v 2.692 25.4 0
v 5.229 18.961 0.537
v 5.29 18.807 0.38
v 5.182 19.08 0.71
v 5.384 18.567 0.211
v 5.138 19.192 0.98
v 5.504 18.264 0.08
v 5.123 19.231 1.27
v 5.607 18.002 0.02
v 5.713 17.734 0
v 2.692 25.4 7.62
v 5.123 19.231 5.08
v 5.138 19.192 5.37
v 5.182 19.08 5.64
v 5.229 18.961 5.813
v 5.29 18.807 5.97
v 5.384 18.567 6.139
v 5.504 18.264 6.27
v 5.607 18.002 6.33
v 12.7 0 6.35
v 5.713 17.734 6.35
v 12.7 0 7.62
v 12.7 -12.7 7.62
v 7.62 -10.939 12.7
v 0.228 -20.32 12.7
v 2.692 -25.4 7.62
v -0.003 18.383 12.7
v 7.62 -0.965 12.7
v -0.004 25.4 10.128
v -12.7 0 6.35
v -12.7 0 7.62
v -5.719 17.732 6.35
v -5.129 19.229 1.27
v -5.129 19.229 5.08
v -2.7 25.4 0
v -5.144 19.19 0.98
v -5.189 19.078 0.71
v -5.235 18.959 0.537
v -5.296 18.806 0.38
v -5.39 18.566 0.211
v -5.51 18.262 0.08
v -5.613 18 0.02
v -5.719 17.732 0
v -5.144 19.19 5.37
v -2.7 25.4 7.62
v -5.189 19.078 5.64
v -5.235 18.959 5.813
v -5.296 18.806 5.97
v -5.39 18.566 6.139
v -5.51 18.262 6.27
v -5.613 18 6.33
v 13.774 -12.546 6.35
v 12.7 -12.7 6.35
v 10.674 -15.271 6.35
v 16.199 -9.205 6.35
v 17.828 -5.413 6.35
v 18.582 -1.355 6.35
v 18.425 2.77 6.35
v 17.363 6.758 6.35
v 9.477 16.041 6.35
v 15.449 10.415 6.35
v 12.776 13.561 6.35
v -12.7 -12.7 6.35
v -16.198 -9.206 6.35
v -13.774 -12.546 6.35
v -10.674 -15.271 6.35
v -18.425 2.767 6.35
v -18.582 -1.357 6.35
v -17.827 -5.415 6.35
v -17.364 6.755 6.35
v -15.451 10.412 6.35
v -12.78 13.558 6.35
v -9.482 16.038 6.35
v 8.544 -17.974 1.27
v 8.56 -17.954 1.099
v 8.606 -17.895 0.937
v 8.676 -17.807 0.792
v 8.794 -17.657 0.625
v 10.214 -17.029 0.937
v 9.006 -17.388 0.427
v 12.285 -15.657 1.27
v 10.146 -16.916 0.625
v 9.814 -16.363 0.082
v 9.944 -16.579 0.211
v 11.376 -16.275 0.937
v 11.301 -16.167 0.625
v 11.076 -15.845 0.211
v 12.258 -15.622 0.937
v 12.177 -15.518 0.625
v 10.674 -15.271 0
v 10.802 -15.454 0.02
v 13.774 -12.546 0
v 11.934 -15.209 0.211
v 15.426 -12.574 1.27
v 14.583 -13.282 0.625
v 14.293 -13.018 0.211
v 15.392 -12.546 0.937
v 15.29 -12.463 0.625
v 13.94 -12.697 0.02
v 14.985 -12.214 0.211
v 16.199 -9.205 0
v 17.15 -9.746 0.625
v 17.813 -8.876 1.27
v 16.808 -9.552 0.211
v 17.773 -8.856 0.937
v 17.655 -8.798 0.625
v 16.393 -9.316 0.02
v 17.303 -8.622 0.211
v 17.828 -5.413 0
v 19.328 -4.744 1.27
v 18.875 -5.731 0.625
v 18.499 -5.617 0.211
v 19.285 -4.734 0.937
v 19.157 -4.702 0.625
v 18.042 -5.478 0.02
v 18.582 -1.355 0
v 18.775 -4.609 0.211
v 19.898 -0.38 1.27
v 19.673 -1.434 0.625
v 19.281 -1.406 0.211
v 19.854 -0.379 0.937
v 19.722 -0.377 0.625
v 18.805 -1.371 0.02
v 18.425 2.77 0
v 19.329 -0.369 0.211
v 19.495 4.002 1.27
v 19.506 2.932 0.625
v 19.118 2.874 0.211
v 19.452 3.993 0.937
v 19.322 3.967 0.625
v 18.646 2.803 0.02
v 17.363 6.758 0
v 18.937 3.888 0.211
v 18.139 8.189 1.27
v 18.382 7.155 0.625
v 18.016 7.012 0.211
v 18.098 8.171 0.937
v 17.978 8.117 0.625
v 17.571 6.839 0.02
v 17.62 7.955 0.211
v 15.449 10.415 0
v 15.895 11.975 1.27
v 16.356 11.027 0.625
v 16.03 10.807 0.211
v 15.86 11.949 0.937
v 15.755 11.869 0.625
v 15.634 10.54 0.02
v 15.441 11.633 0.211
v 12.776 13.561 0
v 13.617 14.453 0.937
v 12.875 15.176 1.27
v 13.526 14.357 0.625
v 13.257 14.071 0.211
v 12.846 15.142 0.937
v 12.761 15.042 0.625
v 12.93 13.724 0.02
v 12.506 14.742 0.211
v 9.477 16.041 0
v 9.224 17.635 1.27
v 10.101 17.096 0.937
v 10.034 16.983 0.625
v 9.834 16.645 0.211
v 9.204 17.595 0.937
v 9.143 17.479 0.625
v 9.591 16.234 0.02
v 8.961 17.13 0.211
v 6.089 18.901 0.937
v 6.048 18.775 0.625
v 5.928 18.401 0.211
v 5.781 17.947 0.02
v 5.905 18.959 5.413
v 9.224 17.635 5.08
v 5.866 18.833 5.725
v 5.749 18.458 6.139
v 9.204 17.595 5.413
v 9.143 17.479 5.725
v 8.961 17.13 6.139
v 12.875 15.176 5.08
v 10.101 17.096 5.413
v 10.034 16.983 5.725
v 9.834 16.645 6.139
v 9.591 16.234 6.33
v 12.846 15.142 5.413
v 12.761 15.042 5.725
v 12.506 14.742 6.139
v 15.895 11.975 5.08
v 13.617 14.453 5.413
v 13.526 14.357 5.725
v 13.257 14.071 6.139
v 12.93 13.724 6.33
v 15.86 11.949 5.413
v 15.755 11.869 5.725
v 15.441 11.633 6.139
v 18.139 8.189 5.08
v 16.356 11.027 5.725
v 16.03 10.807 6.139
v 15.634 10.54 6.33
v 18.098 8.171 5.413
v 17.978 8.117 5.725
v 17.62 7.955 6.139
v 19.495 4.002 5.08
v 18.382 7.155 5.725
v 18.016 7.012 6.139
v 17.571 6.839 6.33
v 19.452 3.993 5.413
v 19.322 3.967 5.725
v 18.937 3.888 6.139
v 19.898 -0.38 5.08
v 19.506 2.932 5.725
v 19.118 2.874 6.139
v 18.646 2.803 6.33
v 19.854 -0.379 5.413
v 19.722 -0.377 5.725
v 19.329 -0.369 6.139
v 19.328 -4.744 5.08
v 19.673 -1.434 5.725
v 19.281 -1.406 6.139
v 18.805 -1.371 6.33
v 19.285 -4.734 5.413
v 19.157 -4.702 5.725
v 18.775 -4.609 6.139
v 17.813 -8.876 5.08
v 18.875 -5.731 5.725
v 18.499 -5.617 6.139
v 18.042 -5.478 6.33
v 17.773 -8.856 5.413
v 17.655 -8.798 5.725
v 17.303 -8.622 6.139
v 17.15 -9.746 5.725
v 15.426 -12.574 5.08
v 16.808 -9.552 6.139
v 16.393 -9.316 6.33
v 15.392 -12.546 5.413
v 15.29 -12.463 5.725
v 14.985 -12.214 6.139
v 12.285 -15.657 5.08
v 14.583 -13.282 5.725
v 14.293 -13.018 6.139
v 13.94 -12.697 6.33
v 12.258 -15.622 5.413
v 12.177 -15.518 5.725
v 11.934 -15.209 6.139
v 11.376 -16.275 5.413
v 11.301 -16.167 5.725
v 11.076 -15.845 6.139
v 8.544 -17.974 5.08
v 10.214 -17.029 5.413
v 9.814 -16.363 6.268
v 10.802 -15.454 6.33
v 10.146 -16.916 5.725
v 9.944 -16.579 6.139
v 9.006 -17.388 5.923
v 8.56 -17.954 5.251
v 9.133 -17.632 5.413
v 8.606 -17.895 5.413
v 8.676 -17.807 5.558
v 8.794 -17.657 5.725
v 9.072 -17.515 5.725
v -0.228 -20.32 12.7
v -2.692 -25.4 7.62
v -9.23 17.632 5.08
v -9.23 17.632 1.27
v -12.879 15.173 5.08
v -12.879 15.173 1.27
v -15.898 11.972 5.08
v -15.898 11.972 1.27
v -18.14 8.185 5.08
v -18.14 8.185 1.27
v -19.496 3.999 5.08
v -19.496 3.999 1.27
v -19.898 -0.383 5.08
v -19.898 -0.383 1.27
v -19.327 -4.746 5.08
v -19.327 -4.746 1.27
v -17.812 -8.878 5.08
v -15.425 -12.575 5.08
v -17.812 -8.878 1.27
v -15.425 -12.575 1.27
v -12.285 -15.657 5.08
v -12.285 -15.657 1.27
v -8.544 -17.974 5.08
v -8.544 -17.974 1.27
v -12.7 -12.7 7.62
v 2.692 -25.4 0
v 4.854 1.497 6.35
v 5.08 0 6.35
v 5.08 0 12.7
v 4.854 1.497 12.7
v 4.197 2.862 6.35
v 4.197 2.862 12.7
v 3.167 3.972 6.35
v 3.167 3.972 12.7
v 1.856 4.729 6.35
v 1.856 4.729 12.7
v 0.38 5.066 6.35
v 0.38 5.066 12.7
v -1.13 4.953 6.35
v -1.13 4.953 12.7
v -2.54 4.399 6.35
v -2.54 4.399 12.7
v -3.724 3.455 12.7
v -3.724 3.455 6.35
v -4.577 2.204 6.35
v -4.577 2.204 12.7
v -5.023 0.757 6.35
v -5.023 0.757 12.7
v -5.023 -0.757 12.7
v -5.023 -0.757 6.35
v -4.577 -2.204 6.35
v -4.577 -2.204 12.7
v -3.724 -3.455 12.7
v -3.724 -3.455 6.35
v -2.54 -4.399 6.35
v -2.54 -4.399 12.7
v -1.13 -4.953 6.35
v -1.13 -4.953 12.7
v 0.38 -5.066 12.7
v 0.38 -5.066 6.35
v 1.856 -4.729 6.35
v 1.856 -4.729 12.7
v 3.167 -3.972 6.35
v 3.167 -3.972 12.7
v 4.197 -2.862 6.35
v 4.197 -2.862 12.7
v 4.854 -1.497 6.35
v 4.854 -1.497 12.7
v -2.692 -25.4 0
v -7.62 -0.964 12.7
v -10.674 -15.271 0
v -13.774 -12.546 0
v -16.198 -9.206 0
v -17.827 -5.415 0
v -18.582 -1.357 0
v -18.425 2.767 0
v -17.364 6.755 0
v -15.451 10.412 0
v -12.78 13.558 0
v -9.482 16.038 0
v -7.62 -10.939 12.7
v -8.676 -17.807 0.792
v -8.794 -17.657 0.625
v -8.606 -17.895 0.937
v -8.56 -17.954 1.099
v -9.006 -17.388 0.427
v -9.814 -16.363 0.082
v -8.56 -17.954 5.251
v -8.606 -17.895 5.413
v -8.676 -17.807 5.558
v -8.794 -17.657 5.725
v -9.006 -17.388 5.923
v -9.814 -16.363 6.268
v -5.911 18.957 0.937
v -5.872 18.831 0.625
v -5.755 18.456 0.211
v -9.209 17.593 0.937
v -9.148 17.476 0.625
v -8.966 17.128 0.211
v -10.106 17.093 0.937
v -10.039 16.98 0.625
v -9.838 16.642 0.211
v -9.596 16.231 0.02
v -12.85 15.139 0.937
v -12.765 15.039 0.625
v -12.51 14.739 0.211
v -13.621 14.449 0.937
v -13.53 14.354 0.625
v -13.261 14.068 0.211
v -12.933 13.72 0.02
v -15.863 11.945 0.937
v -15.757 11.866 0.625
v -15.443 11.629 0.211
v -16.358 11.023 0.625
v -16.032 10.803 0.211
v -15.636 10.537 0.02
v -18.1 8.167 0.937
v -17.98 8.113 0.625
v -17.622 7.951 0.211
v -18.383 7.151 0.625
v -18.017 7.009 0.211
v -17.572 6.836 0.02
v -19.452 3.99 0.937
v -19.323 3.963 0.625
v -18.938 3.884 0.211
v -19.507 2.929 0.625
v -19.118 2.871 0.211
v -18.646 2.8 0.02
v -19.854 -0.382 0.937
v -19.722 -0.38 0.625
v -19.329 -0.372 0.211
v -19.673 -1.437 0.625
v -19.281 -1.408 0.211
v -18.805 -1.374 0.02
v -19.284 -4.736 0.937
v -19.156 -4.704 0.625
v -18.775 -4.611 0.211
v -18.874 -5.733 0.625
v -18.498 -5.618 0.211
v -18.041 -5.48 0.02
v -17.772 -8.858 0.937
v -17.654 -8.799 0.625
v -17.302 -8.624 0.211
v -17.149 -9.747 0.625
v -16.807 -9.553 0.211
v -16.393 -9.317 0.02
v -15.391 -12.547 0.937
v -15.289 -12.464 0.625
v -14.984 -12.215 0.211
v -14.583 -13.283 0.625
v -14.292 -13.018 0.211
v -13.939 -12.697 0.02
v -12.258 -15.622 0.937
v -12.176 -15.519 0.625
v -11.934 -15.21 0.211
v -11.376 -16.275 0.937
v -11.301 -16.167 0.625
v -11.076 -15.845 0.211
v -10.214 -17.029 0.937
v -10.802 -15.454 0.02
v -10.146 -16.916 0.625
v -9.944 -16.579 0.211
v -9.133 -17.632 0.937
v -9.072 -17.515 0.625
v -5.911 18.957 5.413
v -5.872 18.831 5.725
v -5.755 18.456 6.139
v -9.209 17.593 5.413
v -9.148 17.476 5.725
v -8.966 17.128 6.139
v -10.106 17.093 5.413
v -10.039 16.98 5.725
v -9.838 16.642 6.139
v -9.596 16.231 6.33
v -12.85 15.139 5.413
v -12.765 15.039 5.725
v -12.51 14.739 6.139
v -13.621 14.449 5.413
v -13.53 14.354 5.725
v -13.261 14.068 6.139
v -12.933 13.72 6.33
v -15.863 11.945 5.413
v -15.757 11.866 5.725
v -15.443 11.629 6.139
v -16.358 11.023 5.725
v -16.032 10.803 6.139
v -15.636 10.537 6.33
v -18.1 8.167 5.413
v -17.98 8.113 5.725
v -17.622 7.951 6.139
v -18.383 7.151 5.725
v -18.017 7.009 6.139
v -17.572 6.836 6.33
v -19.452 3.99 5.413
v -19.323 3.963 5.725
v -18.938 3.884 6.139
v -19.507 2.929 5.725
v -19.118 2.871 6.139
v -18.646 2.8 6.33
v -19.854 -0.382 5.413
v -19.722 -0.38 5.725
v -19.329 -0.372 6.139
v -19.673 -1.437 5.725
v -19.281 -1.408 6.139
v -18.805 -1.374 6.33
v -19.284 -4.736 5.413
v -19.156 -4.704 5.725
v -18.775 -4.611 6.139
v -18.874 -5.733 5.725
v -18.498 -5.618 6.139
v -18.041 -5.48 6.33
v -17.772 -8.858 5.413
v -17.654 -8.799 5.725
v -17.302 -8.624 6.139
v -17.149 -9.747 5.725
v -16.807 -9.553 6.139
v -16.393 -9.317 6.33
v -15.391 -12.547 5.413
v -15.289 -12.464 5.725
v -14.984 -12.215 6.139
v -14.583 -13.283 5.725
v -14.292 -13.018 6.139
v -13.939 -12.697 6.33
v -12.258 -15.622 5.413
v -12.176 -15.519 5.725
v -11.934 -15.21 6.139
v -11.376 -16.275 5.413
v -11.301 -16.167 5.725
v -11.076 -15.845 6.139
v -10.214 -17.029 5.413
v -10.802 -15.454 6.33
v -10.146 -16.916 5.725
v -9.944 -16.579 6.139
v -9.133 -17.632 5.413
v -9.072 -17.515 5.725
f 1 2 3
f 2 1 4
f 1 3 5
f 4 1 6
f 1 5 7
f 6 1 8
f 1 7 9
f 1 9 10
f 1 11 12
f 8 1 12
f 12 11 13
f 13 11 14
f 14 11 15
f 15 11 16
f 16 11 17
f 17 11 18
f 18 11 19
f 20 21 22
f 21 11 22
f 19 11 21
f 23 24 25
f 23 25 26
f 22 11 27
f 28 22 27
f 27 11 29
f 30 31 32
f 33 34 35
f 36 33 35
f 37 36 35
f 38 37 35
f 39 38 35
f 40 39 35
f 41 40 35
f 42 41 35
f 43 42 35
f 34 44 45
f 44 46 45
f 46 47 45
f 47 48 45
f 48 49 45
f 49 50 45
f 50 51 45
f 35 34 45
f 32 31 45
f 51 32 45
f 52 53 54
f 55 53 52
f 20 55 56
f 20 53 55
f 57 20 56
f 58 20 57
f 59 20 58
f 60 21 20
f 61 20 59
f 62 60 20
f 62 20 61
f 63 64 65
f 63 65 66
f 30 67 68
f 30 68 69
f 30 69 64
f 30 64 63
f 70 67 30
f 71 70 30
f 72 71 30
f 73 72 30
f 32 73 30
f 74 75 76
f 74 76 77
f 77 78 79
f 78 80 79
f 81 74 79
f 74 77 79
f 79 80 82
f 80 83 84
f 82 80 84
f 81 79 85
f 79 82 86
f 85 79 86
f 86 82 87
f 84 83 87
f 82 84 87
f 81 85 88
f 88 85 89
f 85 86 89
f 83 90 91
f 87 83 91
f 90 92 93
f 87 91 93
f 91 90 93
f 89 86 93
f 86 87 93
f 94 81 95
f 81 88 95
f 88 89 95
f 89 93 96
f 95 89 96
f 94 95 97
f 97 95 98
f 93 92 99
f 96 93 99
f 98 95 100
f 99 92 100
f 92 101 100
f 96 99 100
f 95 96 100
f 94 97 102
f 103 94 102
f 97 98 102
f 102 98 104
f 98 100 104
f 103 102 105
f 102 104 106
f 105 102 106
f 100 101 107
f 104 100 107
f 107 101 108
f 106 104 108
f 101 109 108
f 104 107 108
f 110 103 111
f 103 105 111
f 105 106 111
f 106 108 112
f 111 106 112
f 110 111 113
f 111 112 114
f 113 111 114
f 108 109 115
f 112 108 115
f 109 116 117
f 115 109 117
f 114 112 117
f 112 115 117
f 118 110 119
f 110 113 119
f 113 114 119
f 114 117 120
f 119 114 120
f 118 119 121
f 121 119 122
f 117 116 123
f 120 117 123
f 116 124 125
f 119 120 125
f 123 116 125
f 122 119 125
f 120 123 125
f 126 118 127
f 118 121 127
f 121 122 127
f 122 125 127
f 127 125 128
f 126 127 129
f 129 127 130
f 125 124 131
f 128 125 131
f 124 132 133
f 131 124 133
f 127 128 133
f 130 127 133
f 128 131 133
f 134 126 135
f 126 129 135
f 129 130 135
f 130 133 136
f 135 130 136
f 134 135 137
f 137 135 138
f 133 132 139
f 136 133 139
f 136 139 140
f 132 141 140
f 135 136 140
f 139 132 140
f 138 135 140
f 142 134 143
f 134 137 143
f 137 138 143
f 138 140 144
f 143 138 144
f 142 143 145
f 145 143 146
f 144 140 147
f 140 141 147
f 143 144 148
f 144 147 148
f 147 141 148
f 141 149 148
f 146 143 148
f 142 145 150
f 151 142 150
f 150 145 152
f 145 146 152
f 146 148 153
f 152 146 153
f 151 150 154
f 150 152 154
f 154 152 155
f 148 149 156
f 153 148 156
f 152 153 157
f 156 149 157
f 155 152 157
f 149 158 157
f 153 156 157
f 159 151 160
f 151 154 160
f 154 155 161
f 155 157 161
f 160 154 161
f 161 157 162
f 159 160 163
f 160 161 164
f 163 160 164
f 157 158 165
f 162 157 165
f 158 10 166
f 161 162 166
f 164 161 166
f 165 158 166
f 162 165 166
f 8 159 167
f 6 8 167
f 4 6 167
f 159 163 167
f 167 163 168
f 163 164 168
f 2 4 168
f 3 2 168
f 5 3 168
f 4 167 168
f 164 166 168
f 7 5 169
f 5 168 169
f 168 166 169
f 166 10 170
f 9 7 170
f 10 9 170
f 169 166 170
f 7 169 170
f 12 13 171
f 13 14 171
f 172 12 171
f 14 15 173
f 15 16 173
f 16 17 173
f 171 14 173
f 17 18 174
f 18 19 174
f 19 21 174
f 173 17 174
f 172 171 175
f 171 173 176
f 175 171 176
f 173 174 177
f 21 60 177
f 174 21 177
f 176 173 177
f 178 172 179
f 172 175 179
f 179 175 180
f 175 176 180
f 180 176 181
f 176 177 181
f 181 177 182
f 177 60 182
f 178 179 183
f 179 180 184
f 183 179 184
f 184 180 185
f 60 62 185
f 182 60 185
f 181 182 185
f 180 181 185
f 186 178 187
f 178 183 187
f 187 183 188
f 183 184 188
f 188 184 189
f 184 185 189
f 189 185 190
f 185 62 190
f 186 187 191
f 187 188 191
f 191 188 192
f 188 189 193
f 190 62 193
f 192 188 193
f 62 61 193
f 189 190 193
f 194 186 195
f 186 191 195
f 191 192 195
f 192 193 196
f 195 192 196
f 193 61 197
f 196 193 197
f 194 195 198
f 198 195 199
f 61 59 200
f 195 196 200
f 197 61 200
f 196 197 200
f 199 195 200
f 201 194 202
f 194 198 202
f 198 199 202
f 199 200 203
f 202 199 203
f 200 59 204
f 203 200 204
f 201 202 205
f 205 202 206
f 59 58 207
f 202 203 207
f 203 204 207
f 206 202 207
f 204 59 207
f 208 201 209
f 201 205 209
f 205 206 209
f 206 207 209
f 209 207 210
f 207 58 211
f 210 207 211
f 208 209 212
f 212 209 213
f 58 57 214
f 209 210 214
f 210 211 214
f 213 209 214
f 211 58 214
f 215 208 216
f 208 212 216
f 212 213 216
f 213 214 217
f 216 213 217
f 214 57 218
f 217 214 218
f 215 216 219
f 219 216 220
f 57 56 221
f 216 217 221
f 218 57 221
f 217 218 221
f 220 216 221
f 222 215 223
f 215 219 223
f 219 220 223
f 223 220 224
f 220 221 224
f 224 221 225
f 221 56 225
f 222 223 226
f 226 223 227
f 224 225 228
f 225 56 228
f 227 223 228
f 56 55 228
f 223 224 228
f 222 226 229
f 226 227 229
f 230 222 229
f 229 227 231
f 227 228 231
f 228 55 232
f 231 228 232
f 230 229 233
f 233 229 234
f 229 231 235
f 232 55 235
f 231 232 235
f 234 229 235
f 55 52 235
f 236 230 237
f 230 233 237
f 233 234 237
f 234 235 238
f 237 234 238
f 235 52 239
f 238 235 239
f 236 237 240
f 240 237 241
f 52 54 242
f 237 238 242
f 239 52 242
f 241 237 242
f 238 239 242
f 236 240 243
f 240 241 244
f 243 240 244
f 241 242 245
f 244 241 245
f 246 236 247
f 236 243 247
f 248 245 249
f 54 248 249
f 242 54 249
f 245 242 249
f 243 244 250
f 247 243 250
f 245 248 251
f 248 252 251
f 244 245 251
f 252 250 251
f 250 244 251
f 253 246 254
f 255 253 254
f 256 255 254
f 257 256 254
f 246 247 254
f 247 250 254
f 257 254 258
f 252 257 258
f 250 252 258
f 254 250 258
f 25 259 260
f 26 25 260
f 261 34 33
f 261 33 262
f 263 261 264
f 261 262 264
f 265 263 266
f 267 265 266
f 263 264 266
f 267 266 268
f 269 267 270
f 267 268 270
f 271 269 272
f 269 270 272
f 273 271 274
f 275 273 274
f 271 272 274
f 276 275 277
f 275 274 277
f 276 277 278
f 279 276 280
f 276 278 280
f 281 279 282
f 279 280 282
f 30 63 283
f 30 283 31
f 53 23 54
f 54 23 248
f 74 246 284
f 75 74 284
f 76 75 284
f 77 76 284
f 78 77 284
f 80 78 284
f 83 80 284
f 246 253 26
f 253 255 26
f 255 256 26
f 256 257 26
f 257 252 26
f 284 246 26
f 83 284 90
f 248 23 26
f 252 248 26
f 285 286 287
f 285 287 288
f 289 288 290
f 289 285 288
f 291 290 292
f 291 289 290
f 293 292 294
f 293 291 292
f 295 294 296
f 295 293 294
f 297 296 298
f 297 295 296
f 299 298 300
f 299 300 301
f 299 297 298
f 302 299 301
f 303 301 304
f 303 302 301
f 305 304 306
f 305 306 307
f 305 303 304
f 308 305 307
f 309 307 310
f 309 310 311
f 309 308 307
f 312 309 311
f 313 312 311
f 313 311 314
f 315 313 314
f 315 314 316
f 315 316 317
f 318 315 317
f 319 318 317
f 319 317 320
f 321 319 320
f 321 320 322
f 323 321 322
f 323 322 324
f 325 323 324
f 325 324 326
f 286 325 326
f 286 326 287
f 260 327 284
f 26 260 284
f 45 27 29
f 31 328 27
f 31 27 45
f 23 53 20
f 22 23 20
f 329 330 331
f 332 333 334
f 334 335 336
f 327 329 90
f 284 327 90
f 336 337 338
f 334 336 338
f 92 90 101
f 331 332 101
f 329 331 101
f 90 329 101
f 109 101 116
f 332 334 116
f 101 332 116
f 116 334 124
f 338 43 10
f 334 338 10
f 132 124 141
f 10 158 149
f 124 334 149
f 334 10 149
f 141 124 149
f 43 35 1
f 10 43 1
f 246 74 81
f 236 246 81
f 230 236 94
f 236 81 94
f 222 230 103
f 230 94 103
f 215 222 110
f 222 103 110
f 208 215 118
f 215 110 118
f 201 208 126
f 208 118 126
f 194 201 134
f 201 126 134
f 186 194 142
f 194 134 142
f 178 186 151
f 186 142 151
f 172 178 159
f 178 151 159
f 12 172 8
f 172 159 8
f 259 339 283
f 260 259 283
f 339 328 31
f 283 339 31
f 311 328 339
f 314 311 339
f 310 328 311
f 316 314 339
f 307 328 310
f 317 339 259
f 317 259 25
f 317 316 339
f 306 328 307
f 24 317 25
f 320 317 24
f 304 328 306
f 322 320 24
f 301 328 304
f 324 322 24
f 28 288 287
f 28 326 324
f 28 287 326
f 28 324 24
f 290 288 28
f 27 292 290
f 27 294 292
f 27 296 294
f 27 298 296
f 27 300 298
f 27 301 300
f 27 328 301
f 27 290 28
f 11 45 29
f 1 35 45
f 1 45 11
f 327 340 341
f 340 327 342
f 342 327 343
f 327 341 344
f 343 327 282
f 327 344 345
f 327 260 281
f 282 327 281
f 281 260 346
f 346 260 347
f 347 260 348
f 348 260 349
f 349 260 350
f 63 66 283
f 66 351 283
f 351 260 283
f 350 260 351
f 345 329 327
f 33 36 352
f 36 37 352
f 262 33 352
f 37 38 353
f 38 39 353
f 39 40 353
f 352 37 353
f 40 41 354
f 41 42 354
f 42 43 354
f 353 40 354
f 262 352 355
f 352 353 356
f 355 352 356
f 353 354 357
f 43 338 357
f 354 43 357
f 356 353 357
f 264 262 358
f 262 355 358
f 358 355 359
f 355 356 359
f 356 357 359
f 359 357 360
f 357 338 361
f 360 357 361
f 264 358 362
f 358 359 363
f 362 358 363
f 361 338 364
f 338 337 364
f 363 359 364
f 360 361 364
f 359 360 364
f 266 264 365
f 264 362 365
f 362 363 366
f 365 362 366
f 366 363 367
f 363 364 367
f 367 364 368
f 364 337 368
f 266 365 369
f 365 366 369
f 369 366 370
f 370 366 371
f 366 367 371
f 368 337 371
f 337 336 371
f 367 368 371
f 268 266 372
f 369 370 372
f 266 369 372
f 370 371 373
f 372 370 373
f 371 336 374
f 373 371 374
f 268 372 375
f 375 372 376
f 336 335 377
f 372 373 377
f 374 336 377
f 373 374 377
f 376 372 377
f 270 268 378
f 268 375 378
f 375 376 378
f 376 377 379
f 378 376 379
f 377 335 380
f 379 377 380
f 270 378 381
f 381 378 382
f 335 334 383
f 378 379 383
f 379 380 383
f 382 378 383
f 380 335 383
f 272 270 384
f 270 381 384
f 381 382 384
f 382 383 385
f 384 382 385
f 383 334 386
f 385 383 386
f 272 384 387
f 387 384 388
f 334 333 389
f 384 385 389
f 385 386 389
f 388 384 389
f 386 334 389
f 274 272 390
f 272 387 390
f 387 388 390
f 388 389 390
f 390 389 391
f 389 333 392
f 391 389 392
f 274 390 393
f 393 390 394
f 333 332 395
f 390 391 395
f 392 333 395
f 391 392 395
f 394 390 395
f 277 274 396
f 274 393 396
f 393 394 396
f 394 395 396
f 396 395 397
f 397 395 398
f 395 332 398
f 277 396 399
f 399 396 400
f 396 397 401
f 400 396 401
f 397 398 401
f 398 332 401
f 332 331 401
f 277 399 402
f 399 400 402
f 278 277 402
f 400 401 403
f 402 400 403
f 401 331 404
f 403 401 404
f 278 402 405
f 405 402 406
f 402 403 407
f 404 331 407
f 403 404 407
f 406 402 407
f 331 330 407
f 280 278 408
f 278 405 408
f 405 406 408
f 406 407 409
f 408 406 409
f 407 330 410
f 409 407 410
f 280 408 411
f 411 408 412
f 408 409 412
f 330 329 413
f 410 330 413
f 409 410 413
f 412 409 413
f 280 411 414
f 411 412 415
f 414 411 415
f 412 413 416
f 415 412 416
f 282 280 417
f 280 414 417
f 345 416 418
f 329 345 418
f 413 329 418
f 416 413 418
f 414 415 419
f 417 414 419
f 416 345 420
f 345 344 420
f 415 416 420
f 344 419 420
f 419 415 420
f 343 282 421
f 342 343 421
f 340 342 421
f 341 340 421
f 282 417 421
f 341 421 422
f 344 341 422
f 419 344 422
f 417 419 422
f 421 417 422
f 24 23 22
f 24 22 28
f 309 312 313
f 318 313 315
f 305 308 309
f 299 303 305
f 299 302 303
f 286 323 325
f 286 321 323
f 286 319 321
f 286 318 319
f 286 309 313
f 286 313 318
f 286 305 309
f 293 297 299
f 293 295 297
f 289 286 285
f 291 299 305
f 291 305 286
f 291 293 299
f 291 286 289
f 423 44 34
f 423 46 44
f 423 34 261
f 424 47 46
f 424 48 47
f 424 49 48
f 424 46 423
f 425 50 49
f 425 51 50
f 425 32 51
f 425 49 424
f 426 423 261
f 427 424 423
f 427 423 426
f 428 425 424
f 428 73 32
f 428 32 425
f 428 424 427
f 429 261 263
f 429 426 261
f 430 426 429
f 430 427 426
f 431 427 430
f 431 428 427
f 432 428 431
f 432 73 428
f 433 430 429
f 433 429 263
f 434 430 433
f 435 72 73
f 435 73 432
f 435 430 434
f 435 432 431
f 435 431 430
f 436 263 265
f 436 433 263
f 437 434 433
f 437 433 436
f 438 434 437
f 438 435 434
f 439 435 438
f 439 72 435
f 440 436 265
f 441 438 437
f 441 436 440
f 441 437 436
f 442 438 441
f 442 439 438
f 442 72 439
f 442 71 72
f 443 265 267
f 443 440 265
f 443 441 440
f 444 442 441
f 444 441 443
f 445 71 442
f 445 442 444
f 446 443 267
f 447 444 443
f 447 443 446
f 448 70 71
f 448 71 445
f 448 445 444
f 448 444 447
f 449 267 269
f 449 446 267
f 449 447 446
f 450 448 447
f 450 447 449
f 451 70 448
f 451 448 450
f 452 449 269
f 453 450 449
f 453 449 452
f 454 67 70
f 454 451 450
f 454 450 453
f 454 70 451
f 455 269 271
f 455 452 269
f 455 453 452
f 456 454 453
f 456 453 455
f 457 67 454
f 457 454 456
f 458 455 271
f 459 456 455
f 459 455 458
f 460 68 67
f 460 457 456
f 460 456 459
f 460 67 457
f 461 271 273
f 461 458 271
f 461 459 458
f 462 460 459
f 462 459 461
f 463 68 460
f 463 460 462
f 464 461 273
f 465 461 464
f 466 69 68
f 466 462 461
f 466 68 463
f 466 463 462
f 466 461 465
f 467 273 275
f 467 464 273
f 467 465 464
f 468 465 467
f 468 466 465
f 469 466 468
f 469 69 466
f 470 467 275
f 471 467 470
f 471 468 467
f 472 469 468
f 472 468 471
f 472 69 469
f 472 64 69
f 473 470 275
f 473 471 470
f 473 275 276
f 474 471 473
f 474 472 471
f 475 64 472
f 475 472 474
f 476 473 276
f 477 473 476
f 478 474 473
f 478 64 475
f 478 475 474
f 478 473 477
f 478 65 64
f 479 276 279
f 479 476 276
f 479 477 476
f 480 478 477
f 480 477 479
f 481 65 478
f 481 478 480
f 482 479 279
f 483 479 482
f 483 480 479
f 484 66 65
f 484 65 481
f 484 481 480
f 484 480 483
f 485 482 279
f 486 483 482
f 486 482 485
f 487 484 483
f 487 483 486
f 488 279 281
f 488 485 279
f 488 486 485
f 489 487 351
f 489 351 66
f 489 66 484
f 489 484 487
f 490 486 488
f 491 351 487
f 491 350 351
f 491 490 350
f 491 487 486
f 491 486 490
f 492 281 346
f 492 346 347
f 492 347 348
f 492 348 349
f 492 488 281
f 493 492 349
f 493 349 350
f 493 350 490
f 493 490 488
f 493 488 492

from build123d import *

# Parameters (mm, degrees)
F0_W         = 25.4
F0_H         = 50.8
F0_R         = 5.08
F1_DEPTH     = 12.7
F3_DEPTH     = 25.4
F4_T1_DEPTH  = 47.9732038629
F4_T3_DEPTH  = 31.5130991577
F4_T5_DEPTH  = 42.2974691352
F4_T7_DEPTH  = 42.2974691352
F4_T9_DEPTH  = 62.5709452641
F4_T11_DEPTH = 62.5736078482
F4_T16_DEPTH = 31.520364883
F4_T21_DEPTH = 31.520364883
F5_R         = 19.9015863144
F6_DEPTH     = 6.35
F7_R         = 1.27


# Not quite as in the source:
# - a fillet or chamfer that OpenCascade refuses, or shapes differently, is made with other operations: its cross-section is extruded or revolved along the edge and cut away or added


with BuildPart() as f1:
    # F0 (on Top) → F1 (new body)
    with BuildSketch(Plane.XY):
        Rectangle(F0_W, F0_H)
        Circle(F0_R, mode=Mode.SUBTRACT)
    extrude(amount=F1_DEPTH)

    # F2 (on face) → F3 (cut)
    with BuildSketch(Plane.XY.offset(12.7)):
        Polygon((-12.7, 25.4), (-12.7, 0), (-2.6996657252, 25.4), align=None)
        Polygon((-2.6924, -25.4), (-12.7, -12.7), (-12.7, -25.4), align=None)
        Polygon((12.7, -12.7), (2.6924, -25.4), (12.7, -25.4), align=None)
        Polygon((12.7, 25.4), (2.6924, 25.4), (12.7, 0), align=None)
    extrude(amount=-F3_DEPTH, mode=Mode.SUBTRACT)

    # F4: chamfer of 5.08 on 8 edges, made by hand

    # F4_s2 → F4_t1 (cut)
    with BuildSketch(Plane.XZ.offset(-22.2090542841)):
        Polygon((-7.62, 12.7), (-12.7, 7.62), (-12.7, 12.7), align=None)
        Polygon((12.7, 7.62), (7.62, 12.7), (12.7, 12.7), align=None)
    extrude(amount=F4_T1_DEPTH, mode=Mode.SUBTRACT)

    # F4_s4 → F4_t3 (cut)
    with BuildSketch(Plane.YZ.offset(-15.7565495789)):
        Polygon((-20.32, 12.7), (-25.4, 7.62), (-25.4, 12.7), align=None)
    extrude(amount=F4_T3_DEPTH, mode=Mode.SUBTRACT)

    # F4_s6 → F4_t5 (cut)
    with BuildSketch(Plane(origin=(6.7769328826, 8.6001686327, 0), x_dir=(0, 0, 1), z_dir=(-0.6189309664, -0.7854453888, 0))):
        Polygon((12.7, -12.7555797114), (7.62, -17.8355797114), (12.7, -17.8355797114), align=None)
    extrude(amount=F4_T5_DEPTH, mode=Mode.SUBTRACT)

    # F4_s8 → F4_t7 (cut)
    with BuildSketch(Plane(origin=(19.4022805654, -24.6221834587, 0), x_dir=(0, 0, 1), z_dir=(-0.6189309664, 0.7854453888, 0))):
        Polygon((12.7, -12.7555797114), (7.62, -17.8355797114), (12.7, -17.8355797114), align=None)
    extrude(amount=F4_T7_DEPTH, mode=Mode.SUBTRACT)

    # F4_s10 → F4_t9 (cut)
    with BuildSketch(Plane(origin=(-9.8405603892, -24.994187896, 0), x_dir=(0, 0, 1), z_dir=(0.3663429193, 0.9304799114, 0))):
        Polygon((12.7, -6.7370948746), (7.62, -11.8170948746), (12.7, -11.8170948746), align=None)
    extrude(amount=F4_T9_DEPTH, mode=Mode.SUBTRACT)

    # F4_s12 → F4_t11 (cut)
    with BuildSketch(Plane(origin=(-13.0899935353, 33.2233338458, 0), x_dir=(0, 0, 1), z_dir=(0.36657333, -0.9303891625, 0))):
        Polygon((7.62, -11.8159423639), (12.7, -6.7359423639), (12.7, -11.8159423639), align=None)
    extrude(amount=F4_T11_DEPTH, mode=Mode.SUBTRACT)


with BuildPart() as f4_tool14:
    # F4_s15 → F4_t16 (new body)
    with BuildSketch(Plane.YZ.offset(15.7565495789)):
        Polygon((20.32, 12.7), (25.4, 7.62), (25.4, 12.7), align=None)
    extrude(amount=-F4_T16_DEPTH)

    split(bisect_by=Plane(origin=(9.0414950692, 3.5623490573, 9.7179711819), x_dir=(-0.36657333, 0.9303891625, 0), z_dir=(0.657884486, 0.2592064875, 0.7071067812)), keep=Keep.TOP)


with BuildPart() as f1_1:
    add(f1.part)

    # F4_t13: cut F4_tool14
    add(f4_tool14.part, mode=Mode.SUBTRACT)


with BuildPart() as f4_tool19:
    # F4_s20 → F4_t21 (new body)
    with BuildSketch(Plane.YZ.offset(15.7565495789)):
        Polygon((20.32, 12.7), (25.4, 7.62), (25.4, 12.7), align=None)
    extrude(amount=-F4_T21_DEPTH)

    split(bisect_by=Plane(origin=(-9.0429131582, 3.5603210394, 9.7185474373), x_dir=(-0.3663429193, -0.9304799114, 0), z_dir=(-0.6579486551, 0.2590435625, 0.7071067812)), keep=Keep.TOP)


with BuildPart() as f1_2:
    add(f1_1.part)

    # F4_t18: cut F4_tool19
    add(f4_tool19.part, mode=Mode.SUBTRACT)

    # F5 (on Top) → F6 (join)
    with BuildSketch(Plane.XY):
        Circle(F5_R)
    extrude(amount=F6_DEPTH)

    # F7
    f7_edges = [f1_2.edges().sort_by_distance(p)[0] for p in [
        (19.817994, 1.822158, 0),
        (19.817994, 1.822158, 6.35),
        (-19.818285, 1.818991, 6.35),
        (-19.818285, 1.818991, 0),
    ]]
    fillet(f7_edges, radius=F7_R)


solid = f1_2.part
